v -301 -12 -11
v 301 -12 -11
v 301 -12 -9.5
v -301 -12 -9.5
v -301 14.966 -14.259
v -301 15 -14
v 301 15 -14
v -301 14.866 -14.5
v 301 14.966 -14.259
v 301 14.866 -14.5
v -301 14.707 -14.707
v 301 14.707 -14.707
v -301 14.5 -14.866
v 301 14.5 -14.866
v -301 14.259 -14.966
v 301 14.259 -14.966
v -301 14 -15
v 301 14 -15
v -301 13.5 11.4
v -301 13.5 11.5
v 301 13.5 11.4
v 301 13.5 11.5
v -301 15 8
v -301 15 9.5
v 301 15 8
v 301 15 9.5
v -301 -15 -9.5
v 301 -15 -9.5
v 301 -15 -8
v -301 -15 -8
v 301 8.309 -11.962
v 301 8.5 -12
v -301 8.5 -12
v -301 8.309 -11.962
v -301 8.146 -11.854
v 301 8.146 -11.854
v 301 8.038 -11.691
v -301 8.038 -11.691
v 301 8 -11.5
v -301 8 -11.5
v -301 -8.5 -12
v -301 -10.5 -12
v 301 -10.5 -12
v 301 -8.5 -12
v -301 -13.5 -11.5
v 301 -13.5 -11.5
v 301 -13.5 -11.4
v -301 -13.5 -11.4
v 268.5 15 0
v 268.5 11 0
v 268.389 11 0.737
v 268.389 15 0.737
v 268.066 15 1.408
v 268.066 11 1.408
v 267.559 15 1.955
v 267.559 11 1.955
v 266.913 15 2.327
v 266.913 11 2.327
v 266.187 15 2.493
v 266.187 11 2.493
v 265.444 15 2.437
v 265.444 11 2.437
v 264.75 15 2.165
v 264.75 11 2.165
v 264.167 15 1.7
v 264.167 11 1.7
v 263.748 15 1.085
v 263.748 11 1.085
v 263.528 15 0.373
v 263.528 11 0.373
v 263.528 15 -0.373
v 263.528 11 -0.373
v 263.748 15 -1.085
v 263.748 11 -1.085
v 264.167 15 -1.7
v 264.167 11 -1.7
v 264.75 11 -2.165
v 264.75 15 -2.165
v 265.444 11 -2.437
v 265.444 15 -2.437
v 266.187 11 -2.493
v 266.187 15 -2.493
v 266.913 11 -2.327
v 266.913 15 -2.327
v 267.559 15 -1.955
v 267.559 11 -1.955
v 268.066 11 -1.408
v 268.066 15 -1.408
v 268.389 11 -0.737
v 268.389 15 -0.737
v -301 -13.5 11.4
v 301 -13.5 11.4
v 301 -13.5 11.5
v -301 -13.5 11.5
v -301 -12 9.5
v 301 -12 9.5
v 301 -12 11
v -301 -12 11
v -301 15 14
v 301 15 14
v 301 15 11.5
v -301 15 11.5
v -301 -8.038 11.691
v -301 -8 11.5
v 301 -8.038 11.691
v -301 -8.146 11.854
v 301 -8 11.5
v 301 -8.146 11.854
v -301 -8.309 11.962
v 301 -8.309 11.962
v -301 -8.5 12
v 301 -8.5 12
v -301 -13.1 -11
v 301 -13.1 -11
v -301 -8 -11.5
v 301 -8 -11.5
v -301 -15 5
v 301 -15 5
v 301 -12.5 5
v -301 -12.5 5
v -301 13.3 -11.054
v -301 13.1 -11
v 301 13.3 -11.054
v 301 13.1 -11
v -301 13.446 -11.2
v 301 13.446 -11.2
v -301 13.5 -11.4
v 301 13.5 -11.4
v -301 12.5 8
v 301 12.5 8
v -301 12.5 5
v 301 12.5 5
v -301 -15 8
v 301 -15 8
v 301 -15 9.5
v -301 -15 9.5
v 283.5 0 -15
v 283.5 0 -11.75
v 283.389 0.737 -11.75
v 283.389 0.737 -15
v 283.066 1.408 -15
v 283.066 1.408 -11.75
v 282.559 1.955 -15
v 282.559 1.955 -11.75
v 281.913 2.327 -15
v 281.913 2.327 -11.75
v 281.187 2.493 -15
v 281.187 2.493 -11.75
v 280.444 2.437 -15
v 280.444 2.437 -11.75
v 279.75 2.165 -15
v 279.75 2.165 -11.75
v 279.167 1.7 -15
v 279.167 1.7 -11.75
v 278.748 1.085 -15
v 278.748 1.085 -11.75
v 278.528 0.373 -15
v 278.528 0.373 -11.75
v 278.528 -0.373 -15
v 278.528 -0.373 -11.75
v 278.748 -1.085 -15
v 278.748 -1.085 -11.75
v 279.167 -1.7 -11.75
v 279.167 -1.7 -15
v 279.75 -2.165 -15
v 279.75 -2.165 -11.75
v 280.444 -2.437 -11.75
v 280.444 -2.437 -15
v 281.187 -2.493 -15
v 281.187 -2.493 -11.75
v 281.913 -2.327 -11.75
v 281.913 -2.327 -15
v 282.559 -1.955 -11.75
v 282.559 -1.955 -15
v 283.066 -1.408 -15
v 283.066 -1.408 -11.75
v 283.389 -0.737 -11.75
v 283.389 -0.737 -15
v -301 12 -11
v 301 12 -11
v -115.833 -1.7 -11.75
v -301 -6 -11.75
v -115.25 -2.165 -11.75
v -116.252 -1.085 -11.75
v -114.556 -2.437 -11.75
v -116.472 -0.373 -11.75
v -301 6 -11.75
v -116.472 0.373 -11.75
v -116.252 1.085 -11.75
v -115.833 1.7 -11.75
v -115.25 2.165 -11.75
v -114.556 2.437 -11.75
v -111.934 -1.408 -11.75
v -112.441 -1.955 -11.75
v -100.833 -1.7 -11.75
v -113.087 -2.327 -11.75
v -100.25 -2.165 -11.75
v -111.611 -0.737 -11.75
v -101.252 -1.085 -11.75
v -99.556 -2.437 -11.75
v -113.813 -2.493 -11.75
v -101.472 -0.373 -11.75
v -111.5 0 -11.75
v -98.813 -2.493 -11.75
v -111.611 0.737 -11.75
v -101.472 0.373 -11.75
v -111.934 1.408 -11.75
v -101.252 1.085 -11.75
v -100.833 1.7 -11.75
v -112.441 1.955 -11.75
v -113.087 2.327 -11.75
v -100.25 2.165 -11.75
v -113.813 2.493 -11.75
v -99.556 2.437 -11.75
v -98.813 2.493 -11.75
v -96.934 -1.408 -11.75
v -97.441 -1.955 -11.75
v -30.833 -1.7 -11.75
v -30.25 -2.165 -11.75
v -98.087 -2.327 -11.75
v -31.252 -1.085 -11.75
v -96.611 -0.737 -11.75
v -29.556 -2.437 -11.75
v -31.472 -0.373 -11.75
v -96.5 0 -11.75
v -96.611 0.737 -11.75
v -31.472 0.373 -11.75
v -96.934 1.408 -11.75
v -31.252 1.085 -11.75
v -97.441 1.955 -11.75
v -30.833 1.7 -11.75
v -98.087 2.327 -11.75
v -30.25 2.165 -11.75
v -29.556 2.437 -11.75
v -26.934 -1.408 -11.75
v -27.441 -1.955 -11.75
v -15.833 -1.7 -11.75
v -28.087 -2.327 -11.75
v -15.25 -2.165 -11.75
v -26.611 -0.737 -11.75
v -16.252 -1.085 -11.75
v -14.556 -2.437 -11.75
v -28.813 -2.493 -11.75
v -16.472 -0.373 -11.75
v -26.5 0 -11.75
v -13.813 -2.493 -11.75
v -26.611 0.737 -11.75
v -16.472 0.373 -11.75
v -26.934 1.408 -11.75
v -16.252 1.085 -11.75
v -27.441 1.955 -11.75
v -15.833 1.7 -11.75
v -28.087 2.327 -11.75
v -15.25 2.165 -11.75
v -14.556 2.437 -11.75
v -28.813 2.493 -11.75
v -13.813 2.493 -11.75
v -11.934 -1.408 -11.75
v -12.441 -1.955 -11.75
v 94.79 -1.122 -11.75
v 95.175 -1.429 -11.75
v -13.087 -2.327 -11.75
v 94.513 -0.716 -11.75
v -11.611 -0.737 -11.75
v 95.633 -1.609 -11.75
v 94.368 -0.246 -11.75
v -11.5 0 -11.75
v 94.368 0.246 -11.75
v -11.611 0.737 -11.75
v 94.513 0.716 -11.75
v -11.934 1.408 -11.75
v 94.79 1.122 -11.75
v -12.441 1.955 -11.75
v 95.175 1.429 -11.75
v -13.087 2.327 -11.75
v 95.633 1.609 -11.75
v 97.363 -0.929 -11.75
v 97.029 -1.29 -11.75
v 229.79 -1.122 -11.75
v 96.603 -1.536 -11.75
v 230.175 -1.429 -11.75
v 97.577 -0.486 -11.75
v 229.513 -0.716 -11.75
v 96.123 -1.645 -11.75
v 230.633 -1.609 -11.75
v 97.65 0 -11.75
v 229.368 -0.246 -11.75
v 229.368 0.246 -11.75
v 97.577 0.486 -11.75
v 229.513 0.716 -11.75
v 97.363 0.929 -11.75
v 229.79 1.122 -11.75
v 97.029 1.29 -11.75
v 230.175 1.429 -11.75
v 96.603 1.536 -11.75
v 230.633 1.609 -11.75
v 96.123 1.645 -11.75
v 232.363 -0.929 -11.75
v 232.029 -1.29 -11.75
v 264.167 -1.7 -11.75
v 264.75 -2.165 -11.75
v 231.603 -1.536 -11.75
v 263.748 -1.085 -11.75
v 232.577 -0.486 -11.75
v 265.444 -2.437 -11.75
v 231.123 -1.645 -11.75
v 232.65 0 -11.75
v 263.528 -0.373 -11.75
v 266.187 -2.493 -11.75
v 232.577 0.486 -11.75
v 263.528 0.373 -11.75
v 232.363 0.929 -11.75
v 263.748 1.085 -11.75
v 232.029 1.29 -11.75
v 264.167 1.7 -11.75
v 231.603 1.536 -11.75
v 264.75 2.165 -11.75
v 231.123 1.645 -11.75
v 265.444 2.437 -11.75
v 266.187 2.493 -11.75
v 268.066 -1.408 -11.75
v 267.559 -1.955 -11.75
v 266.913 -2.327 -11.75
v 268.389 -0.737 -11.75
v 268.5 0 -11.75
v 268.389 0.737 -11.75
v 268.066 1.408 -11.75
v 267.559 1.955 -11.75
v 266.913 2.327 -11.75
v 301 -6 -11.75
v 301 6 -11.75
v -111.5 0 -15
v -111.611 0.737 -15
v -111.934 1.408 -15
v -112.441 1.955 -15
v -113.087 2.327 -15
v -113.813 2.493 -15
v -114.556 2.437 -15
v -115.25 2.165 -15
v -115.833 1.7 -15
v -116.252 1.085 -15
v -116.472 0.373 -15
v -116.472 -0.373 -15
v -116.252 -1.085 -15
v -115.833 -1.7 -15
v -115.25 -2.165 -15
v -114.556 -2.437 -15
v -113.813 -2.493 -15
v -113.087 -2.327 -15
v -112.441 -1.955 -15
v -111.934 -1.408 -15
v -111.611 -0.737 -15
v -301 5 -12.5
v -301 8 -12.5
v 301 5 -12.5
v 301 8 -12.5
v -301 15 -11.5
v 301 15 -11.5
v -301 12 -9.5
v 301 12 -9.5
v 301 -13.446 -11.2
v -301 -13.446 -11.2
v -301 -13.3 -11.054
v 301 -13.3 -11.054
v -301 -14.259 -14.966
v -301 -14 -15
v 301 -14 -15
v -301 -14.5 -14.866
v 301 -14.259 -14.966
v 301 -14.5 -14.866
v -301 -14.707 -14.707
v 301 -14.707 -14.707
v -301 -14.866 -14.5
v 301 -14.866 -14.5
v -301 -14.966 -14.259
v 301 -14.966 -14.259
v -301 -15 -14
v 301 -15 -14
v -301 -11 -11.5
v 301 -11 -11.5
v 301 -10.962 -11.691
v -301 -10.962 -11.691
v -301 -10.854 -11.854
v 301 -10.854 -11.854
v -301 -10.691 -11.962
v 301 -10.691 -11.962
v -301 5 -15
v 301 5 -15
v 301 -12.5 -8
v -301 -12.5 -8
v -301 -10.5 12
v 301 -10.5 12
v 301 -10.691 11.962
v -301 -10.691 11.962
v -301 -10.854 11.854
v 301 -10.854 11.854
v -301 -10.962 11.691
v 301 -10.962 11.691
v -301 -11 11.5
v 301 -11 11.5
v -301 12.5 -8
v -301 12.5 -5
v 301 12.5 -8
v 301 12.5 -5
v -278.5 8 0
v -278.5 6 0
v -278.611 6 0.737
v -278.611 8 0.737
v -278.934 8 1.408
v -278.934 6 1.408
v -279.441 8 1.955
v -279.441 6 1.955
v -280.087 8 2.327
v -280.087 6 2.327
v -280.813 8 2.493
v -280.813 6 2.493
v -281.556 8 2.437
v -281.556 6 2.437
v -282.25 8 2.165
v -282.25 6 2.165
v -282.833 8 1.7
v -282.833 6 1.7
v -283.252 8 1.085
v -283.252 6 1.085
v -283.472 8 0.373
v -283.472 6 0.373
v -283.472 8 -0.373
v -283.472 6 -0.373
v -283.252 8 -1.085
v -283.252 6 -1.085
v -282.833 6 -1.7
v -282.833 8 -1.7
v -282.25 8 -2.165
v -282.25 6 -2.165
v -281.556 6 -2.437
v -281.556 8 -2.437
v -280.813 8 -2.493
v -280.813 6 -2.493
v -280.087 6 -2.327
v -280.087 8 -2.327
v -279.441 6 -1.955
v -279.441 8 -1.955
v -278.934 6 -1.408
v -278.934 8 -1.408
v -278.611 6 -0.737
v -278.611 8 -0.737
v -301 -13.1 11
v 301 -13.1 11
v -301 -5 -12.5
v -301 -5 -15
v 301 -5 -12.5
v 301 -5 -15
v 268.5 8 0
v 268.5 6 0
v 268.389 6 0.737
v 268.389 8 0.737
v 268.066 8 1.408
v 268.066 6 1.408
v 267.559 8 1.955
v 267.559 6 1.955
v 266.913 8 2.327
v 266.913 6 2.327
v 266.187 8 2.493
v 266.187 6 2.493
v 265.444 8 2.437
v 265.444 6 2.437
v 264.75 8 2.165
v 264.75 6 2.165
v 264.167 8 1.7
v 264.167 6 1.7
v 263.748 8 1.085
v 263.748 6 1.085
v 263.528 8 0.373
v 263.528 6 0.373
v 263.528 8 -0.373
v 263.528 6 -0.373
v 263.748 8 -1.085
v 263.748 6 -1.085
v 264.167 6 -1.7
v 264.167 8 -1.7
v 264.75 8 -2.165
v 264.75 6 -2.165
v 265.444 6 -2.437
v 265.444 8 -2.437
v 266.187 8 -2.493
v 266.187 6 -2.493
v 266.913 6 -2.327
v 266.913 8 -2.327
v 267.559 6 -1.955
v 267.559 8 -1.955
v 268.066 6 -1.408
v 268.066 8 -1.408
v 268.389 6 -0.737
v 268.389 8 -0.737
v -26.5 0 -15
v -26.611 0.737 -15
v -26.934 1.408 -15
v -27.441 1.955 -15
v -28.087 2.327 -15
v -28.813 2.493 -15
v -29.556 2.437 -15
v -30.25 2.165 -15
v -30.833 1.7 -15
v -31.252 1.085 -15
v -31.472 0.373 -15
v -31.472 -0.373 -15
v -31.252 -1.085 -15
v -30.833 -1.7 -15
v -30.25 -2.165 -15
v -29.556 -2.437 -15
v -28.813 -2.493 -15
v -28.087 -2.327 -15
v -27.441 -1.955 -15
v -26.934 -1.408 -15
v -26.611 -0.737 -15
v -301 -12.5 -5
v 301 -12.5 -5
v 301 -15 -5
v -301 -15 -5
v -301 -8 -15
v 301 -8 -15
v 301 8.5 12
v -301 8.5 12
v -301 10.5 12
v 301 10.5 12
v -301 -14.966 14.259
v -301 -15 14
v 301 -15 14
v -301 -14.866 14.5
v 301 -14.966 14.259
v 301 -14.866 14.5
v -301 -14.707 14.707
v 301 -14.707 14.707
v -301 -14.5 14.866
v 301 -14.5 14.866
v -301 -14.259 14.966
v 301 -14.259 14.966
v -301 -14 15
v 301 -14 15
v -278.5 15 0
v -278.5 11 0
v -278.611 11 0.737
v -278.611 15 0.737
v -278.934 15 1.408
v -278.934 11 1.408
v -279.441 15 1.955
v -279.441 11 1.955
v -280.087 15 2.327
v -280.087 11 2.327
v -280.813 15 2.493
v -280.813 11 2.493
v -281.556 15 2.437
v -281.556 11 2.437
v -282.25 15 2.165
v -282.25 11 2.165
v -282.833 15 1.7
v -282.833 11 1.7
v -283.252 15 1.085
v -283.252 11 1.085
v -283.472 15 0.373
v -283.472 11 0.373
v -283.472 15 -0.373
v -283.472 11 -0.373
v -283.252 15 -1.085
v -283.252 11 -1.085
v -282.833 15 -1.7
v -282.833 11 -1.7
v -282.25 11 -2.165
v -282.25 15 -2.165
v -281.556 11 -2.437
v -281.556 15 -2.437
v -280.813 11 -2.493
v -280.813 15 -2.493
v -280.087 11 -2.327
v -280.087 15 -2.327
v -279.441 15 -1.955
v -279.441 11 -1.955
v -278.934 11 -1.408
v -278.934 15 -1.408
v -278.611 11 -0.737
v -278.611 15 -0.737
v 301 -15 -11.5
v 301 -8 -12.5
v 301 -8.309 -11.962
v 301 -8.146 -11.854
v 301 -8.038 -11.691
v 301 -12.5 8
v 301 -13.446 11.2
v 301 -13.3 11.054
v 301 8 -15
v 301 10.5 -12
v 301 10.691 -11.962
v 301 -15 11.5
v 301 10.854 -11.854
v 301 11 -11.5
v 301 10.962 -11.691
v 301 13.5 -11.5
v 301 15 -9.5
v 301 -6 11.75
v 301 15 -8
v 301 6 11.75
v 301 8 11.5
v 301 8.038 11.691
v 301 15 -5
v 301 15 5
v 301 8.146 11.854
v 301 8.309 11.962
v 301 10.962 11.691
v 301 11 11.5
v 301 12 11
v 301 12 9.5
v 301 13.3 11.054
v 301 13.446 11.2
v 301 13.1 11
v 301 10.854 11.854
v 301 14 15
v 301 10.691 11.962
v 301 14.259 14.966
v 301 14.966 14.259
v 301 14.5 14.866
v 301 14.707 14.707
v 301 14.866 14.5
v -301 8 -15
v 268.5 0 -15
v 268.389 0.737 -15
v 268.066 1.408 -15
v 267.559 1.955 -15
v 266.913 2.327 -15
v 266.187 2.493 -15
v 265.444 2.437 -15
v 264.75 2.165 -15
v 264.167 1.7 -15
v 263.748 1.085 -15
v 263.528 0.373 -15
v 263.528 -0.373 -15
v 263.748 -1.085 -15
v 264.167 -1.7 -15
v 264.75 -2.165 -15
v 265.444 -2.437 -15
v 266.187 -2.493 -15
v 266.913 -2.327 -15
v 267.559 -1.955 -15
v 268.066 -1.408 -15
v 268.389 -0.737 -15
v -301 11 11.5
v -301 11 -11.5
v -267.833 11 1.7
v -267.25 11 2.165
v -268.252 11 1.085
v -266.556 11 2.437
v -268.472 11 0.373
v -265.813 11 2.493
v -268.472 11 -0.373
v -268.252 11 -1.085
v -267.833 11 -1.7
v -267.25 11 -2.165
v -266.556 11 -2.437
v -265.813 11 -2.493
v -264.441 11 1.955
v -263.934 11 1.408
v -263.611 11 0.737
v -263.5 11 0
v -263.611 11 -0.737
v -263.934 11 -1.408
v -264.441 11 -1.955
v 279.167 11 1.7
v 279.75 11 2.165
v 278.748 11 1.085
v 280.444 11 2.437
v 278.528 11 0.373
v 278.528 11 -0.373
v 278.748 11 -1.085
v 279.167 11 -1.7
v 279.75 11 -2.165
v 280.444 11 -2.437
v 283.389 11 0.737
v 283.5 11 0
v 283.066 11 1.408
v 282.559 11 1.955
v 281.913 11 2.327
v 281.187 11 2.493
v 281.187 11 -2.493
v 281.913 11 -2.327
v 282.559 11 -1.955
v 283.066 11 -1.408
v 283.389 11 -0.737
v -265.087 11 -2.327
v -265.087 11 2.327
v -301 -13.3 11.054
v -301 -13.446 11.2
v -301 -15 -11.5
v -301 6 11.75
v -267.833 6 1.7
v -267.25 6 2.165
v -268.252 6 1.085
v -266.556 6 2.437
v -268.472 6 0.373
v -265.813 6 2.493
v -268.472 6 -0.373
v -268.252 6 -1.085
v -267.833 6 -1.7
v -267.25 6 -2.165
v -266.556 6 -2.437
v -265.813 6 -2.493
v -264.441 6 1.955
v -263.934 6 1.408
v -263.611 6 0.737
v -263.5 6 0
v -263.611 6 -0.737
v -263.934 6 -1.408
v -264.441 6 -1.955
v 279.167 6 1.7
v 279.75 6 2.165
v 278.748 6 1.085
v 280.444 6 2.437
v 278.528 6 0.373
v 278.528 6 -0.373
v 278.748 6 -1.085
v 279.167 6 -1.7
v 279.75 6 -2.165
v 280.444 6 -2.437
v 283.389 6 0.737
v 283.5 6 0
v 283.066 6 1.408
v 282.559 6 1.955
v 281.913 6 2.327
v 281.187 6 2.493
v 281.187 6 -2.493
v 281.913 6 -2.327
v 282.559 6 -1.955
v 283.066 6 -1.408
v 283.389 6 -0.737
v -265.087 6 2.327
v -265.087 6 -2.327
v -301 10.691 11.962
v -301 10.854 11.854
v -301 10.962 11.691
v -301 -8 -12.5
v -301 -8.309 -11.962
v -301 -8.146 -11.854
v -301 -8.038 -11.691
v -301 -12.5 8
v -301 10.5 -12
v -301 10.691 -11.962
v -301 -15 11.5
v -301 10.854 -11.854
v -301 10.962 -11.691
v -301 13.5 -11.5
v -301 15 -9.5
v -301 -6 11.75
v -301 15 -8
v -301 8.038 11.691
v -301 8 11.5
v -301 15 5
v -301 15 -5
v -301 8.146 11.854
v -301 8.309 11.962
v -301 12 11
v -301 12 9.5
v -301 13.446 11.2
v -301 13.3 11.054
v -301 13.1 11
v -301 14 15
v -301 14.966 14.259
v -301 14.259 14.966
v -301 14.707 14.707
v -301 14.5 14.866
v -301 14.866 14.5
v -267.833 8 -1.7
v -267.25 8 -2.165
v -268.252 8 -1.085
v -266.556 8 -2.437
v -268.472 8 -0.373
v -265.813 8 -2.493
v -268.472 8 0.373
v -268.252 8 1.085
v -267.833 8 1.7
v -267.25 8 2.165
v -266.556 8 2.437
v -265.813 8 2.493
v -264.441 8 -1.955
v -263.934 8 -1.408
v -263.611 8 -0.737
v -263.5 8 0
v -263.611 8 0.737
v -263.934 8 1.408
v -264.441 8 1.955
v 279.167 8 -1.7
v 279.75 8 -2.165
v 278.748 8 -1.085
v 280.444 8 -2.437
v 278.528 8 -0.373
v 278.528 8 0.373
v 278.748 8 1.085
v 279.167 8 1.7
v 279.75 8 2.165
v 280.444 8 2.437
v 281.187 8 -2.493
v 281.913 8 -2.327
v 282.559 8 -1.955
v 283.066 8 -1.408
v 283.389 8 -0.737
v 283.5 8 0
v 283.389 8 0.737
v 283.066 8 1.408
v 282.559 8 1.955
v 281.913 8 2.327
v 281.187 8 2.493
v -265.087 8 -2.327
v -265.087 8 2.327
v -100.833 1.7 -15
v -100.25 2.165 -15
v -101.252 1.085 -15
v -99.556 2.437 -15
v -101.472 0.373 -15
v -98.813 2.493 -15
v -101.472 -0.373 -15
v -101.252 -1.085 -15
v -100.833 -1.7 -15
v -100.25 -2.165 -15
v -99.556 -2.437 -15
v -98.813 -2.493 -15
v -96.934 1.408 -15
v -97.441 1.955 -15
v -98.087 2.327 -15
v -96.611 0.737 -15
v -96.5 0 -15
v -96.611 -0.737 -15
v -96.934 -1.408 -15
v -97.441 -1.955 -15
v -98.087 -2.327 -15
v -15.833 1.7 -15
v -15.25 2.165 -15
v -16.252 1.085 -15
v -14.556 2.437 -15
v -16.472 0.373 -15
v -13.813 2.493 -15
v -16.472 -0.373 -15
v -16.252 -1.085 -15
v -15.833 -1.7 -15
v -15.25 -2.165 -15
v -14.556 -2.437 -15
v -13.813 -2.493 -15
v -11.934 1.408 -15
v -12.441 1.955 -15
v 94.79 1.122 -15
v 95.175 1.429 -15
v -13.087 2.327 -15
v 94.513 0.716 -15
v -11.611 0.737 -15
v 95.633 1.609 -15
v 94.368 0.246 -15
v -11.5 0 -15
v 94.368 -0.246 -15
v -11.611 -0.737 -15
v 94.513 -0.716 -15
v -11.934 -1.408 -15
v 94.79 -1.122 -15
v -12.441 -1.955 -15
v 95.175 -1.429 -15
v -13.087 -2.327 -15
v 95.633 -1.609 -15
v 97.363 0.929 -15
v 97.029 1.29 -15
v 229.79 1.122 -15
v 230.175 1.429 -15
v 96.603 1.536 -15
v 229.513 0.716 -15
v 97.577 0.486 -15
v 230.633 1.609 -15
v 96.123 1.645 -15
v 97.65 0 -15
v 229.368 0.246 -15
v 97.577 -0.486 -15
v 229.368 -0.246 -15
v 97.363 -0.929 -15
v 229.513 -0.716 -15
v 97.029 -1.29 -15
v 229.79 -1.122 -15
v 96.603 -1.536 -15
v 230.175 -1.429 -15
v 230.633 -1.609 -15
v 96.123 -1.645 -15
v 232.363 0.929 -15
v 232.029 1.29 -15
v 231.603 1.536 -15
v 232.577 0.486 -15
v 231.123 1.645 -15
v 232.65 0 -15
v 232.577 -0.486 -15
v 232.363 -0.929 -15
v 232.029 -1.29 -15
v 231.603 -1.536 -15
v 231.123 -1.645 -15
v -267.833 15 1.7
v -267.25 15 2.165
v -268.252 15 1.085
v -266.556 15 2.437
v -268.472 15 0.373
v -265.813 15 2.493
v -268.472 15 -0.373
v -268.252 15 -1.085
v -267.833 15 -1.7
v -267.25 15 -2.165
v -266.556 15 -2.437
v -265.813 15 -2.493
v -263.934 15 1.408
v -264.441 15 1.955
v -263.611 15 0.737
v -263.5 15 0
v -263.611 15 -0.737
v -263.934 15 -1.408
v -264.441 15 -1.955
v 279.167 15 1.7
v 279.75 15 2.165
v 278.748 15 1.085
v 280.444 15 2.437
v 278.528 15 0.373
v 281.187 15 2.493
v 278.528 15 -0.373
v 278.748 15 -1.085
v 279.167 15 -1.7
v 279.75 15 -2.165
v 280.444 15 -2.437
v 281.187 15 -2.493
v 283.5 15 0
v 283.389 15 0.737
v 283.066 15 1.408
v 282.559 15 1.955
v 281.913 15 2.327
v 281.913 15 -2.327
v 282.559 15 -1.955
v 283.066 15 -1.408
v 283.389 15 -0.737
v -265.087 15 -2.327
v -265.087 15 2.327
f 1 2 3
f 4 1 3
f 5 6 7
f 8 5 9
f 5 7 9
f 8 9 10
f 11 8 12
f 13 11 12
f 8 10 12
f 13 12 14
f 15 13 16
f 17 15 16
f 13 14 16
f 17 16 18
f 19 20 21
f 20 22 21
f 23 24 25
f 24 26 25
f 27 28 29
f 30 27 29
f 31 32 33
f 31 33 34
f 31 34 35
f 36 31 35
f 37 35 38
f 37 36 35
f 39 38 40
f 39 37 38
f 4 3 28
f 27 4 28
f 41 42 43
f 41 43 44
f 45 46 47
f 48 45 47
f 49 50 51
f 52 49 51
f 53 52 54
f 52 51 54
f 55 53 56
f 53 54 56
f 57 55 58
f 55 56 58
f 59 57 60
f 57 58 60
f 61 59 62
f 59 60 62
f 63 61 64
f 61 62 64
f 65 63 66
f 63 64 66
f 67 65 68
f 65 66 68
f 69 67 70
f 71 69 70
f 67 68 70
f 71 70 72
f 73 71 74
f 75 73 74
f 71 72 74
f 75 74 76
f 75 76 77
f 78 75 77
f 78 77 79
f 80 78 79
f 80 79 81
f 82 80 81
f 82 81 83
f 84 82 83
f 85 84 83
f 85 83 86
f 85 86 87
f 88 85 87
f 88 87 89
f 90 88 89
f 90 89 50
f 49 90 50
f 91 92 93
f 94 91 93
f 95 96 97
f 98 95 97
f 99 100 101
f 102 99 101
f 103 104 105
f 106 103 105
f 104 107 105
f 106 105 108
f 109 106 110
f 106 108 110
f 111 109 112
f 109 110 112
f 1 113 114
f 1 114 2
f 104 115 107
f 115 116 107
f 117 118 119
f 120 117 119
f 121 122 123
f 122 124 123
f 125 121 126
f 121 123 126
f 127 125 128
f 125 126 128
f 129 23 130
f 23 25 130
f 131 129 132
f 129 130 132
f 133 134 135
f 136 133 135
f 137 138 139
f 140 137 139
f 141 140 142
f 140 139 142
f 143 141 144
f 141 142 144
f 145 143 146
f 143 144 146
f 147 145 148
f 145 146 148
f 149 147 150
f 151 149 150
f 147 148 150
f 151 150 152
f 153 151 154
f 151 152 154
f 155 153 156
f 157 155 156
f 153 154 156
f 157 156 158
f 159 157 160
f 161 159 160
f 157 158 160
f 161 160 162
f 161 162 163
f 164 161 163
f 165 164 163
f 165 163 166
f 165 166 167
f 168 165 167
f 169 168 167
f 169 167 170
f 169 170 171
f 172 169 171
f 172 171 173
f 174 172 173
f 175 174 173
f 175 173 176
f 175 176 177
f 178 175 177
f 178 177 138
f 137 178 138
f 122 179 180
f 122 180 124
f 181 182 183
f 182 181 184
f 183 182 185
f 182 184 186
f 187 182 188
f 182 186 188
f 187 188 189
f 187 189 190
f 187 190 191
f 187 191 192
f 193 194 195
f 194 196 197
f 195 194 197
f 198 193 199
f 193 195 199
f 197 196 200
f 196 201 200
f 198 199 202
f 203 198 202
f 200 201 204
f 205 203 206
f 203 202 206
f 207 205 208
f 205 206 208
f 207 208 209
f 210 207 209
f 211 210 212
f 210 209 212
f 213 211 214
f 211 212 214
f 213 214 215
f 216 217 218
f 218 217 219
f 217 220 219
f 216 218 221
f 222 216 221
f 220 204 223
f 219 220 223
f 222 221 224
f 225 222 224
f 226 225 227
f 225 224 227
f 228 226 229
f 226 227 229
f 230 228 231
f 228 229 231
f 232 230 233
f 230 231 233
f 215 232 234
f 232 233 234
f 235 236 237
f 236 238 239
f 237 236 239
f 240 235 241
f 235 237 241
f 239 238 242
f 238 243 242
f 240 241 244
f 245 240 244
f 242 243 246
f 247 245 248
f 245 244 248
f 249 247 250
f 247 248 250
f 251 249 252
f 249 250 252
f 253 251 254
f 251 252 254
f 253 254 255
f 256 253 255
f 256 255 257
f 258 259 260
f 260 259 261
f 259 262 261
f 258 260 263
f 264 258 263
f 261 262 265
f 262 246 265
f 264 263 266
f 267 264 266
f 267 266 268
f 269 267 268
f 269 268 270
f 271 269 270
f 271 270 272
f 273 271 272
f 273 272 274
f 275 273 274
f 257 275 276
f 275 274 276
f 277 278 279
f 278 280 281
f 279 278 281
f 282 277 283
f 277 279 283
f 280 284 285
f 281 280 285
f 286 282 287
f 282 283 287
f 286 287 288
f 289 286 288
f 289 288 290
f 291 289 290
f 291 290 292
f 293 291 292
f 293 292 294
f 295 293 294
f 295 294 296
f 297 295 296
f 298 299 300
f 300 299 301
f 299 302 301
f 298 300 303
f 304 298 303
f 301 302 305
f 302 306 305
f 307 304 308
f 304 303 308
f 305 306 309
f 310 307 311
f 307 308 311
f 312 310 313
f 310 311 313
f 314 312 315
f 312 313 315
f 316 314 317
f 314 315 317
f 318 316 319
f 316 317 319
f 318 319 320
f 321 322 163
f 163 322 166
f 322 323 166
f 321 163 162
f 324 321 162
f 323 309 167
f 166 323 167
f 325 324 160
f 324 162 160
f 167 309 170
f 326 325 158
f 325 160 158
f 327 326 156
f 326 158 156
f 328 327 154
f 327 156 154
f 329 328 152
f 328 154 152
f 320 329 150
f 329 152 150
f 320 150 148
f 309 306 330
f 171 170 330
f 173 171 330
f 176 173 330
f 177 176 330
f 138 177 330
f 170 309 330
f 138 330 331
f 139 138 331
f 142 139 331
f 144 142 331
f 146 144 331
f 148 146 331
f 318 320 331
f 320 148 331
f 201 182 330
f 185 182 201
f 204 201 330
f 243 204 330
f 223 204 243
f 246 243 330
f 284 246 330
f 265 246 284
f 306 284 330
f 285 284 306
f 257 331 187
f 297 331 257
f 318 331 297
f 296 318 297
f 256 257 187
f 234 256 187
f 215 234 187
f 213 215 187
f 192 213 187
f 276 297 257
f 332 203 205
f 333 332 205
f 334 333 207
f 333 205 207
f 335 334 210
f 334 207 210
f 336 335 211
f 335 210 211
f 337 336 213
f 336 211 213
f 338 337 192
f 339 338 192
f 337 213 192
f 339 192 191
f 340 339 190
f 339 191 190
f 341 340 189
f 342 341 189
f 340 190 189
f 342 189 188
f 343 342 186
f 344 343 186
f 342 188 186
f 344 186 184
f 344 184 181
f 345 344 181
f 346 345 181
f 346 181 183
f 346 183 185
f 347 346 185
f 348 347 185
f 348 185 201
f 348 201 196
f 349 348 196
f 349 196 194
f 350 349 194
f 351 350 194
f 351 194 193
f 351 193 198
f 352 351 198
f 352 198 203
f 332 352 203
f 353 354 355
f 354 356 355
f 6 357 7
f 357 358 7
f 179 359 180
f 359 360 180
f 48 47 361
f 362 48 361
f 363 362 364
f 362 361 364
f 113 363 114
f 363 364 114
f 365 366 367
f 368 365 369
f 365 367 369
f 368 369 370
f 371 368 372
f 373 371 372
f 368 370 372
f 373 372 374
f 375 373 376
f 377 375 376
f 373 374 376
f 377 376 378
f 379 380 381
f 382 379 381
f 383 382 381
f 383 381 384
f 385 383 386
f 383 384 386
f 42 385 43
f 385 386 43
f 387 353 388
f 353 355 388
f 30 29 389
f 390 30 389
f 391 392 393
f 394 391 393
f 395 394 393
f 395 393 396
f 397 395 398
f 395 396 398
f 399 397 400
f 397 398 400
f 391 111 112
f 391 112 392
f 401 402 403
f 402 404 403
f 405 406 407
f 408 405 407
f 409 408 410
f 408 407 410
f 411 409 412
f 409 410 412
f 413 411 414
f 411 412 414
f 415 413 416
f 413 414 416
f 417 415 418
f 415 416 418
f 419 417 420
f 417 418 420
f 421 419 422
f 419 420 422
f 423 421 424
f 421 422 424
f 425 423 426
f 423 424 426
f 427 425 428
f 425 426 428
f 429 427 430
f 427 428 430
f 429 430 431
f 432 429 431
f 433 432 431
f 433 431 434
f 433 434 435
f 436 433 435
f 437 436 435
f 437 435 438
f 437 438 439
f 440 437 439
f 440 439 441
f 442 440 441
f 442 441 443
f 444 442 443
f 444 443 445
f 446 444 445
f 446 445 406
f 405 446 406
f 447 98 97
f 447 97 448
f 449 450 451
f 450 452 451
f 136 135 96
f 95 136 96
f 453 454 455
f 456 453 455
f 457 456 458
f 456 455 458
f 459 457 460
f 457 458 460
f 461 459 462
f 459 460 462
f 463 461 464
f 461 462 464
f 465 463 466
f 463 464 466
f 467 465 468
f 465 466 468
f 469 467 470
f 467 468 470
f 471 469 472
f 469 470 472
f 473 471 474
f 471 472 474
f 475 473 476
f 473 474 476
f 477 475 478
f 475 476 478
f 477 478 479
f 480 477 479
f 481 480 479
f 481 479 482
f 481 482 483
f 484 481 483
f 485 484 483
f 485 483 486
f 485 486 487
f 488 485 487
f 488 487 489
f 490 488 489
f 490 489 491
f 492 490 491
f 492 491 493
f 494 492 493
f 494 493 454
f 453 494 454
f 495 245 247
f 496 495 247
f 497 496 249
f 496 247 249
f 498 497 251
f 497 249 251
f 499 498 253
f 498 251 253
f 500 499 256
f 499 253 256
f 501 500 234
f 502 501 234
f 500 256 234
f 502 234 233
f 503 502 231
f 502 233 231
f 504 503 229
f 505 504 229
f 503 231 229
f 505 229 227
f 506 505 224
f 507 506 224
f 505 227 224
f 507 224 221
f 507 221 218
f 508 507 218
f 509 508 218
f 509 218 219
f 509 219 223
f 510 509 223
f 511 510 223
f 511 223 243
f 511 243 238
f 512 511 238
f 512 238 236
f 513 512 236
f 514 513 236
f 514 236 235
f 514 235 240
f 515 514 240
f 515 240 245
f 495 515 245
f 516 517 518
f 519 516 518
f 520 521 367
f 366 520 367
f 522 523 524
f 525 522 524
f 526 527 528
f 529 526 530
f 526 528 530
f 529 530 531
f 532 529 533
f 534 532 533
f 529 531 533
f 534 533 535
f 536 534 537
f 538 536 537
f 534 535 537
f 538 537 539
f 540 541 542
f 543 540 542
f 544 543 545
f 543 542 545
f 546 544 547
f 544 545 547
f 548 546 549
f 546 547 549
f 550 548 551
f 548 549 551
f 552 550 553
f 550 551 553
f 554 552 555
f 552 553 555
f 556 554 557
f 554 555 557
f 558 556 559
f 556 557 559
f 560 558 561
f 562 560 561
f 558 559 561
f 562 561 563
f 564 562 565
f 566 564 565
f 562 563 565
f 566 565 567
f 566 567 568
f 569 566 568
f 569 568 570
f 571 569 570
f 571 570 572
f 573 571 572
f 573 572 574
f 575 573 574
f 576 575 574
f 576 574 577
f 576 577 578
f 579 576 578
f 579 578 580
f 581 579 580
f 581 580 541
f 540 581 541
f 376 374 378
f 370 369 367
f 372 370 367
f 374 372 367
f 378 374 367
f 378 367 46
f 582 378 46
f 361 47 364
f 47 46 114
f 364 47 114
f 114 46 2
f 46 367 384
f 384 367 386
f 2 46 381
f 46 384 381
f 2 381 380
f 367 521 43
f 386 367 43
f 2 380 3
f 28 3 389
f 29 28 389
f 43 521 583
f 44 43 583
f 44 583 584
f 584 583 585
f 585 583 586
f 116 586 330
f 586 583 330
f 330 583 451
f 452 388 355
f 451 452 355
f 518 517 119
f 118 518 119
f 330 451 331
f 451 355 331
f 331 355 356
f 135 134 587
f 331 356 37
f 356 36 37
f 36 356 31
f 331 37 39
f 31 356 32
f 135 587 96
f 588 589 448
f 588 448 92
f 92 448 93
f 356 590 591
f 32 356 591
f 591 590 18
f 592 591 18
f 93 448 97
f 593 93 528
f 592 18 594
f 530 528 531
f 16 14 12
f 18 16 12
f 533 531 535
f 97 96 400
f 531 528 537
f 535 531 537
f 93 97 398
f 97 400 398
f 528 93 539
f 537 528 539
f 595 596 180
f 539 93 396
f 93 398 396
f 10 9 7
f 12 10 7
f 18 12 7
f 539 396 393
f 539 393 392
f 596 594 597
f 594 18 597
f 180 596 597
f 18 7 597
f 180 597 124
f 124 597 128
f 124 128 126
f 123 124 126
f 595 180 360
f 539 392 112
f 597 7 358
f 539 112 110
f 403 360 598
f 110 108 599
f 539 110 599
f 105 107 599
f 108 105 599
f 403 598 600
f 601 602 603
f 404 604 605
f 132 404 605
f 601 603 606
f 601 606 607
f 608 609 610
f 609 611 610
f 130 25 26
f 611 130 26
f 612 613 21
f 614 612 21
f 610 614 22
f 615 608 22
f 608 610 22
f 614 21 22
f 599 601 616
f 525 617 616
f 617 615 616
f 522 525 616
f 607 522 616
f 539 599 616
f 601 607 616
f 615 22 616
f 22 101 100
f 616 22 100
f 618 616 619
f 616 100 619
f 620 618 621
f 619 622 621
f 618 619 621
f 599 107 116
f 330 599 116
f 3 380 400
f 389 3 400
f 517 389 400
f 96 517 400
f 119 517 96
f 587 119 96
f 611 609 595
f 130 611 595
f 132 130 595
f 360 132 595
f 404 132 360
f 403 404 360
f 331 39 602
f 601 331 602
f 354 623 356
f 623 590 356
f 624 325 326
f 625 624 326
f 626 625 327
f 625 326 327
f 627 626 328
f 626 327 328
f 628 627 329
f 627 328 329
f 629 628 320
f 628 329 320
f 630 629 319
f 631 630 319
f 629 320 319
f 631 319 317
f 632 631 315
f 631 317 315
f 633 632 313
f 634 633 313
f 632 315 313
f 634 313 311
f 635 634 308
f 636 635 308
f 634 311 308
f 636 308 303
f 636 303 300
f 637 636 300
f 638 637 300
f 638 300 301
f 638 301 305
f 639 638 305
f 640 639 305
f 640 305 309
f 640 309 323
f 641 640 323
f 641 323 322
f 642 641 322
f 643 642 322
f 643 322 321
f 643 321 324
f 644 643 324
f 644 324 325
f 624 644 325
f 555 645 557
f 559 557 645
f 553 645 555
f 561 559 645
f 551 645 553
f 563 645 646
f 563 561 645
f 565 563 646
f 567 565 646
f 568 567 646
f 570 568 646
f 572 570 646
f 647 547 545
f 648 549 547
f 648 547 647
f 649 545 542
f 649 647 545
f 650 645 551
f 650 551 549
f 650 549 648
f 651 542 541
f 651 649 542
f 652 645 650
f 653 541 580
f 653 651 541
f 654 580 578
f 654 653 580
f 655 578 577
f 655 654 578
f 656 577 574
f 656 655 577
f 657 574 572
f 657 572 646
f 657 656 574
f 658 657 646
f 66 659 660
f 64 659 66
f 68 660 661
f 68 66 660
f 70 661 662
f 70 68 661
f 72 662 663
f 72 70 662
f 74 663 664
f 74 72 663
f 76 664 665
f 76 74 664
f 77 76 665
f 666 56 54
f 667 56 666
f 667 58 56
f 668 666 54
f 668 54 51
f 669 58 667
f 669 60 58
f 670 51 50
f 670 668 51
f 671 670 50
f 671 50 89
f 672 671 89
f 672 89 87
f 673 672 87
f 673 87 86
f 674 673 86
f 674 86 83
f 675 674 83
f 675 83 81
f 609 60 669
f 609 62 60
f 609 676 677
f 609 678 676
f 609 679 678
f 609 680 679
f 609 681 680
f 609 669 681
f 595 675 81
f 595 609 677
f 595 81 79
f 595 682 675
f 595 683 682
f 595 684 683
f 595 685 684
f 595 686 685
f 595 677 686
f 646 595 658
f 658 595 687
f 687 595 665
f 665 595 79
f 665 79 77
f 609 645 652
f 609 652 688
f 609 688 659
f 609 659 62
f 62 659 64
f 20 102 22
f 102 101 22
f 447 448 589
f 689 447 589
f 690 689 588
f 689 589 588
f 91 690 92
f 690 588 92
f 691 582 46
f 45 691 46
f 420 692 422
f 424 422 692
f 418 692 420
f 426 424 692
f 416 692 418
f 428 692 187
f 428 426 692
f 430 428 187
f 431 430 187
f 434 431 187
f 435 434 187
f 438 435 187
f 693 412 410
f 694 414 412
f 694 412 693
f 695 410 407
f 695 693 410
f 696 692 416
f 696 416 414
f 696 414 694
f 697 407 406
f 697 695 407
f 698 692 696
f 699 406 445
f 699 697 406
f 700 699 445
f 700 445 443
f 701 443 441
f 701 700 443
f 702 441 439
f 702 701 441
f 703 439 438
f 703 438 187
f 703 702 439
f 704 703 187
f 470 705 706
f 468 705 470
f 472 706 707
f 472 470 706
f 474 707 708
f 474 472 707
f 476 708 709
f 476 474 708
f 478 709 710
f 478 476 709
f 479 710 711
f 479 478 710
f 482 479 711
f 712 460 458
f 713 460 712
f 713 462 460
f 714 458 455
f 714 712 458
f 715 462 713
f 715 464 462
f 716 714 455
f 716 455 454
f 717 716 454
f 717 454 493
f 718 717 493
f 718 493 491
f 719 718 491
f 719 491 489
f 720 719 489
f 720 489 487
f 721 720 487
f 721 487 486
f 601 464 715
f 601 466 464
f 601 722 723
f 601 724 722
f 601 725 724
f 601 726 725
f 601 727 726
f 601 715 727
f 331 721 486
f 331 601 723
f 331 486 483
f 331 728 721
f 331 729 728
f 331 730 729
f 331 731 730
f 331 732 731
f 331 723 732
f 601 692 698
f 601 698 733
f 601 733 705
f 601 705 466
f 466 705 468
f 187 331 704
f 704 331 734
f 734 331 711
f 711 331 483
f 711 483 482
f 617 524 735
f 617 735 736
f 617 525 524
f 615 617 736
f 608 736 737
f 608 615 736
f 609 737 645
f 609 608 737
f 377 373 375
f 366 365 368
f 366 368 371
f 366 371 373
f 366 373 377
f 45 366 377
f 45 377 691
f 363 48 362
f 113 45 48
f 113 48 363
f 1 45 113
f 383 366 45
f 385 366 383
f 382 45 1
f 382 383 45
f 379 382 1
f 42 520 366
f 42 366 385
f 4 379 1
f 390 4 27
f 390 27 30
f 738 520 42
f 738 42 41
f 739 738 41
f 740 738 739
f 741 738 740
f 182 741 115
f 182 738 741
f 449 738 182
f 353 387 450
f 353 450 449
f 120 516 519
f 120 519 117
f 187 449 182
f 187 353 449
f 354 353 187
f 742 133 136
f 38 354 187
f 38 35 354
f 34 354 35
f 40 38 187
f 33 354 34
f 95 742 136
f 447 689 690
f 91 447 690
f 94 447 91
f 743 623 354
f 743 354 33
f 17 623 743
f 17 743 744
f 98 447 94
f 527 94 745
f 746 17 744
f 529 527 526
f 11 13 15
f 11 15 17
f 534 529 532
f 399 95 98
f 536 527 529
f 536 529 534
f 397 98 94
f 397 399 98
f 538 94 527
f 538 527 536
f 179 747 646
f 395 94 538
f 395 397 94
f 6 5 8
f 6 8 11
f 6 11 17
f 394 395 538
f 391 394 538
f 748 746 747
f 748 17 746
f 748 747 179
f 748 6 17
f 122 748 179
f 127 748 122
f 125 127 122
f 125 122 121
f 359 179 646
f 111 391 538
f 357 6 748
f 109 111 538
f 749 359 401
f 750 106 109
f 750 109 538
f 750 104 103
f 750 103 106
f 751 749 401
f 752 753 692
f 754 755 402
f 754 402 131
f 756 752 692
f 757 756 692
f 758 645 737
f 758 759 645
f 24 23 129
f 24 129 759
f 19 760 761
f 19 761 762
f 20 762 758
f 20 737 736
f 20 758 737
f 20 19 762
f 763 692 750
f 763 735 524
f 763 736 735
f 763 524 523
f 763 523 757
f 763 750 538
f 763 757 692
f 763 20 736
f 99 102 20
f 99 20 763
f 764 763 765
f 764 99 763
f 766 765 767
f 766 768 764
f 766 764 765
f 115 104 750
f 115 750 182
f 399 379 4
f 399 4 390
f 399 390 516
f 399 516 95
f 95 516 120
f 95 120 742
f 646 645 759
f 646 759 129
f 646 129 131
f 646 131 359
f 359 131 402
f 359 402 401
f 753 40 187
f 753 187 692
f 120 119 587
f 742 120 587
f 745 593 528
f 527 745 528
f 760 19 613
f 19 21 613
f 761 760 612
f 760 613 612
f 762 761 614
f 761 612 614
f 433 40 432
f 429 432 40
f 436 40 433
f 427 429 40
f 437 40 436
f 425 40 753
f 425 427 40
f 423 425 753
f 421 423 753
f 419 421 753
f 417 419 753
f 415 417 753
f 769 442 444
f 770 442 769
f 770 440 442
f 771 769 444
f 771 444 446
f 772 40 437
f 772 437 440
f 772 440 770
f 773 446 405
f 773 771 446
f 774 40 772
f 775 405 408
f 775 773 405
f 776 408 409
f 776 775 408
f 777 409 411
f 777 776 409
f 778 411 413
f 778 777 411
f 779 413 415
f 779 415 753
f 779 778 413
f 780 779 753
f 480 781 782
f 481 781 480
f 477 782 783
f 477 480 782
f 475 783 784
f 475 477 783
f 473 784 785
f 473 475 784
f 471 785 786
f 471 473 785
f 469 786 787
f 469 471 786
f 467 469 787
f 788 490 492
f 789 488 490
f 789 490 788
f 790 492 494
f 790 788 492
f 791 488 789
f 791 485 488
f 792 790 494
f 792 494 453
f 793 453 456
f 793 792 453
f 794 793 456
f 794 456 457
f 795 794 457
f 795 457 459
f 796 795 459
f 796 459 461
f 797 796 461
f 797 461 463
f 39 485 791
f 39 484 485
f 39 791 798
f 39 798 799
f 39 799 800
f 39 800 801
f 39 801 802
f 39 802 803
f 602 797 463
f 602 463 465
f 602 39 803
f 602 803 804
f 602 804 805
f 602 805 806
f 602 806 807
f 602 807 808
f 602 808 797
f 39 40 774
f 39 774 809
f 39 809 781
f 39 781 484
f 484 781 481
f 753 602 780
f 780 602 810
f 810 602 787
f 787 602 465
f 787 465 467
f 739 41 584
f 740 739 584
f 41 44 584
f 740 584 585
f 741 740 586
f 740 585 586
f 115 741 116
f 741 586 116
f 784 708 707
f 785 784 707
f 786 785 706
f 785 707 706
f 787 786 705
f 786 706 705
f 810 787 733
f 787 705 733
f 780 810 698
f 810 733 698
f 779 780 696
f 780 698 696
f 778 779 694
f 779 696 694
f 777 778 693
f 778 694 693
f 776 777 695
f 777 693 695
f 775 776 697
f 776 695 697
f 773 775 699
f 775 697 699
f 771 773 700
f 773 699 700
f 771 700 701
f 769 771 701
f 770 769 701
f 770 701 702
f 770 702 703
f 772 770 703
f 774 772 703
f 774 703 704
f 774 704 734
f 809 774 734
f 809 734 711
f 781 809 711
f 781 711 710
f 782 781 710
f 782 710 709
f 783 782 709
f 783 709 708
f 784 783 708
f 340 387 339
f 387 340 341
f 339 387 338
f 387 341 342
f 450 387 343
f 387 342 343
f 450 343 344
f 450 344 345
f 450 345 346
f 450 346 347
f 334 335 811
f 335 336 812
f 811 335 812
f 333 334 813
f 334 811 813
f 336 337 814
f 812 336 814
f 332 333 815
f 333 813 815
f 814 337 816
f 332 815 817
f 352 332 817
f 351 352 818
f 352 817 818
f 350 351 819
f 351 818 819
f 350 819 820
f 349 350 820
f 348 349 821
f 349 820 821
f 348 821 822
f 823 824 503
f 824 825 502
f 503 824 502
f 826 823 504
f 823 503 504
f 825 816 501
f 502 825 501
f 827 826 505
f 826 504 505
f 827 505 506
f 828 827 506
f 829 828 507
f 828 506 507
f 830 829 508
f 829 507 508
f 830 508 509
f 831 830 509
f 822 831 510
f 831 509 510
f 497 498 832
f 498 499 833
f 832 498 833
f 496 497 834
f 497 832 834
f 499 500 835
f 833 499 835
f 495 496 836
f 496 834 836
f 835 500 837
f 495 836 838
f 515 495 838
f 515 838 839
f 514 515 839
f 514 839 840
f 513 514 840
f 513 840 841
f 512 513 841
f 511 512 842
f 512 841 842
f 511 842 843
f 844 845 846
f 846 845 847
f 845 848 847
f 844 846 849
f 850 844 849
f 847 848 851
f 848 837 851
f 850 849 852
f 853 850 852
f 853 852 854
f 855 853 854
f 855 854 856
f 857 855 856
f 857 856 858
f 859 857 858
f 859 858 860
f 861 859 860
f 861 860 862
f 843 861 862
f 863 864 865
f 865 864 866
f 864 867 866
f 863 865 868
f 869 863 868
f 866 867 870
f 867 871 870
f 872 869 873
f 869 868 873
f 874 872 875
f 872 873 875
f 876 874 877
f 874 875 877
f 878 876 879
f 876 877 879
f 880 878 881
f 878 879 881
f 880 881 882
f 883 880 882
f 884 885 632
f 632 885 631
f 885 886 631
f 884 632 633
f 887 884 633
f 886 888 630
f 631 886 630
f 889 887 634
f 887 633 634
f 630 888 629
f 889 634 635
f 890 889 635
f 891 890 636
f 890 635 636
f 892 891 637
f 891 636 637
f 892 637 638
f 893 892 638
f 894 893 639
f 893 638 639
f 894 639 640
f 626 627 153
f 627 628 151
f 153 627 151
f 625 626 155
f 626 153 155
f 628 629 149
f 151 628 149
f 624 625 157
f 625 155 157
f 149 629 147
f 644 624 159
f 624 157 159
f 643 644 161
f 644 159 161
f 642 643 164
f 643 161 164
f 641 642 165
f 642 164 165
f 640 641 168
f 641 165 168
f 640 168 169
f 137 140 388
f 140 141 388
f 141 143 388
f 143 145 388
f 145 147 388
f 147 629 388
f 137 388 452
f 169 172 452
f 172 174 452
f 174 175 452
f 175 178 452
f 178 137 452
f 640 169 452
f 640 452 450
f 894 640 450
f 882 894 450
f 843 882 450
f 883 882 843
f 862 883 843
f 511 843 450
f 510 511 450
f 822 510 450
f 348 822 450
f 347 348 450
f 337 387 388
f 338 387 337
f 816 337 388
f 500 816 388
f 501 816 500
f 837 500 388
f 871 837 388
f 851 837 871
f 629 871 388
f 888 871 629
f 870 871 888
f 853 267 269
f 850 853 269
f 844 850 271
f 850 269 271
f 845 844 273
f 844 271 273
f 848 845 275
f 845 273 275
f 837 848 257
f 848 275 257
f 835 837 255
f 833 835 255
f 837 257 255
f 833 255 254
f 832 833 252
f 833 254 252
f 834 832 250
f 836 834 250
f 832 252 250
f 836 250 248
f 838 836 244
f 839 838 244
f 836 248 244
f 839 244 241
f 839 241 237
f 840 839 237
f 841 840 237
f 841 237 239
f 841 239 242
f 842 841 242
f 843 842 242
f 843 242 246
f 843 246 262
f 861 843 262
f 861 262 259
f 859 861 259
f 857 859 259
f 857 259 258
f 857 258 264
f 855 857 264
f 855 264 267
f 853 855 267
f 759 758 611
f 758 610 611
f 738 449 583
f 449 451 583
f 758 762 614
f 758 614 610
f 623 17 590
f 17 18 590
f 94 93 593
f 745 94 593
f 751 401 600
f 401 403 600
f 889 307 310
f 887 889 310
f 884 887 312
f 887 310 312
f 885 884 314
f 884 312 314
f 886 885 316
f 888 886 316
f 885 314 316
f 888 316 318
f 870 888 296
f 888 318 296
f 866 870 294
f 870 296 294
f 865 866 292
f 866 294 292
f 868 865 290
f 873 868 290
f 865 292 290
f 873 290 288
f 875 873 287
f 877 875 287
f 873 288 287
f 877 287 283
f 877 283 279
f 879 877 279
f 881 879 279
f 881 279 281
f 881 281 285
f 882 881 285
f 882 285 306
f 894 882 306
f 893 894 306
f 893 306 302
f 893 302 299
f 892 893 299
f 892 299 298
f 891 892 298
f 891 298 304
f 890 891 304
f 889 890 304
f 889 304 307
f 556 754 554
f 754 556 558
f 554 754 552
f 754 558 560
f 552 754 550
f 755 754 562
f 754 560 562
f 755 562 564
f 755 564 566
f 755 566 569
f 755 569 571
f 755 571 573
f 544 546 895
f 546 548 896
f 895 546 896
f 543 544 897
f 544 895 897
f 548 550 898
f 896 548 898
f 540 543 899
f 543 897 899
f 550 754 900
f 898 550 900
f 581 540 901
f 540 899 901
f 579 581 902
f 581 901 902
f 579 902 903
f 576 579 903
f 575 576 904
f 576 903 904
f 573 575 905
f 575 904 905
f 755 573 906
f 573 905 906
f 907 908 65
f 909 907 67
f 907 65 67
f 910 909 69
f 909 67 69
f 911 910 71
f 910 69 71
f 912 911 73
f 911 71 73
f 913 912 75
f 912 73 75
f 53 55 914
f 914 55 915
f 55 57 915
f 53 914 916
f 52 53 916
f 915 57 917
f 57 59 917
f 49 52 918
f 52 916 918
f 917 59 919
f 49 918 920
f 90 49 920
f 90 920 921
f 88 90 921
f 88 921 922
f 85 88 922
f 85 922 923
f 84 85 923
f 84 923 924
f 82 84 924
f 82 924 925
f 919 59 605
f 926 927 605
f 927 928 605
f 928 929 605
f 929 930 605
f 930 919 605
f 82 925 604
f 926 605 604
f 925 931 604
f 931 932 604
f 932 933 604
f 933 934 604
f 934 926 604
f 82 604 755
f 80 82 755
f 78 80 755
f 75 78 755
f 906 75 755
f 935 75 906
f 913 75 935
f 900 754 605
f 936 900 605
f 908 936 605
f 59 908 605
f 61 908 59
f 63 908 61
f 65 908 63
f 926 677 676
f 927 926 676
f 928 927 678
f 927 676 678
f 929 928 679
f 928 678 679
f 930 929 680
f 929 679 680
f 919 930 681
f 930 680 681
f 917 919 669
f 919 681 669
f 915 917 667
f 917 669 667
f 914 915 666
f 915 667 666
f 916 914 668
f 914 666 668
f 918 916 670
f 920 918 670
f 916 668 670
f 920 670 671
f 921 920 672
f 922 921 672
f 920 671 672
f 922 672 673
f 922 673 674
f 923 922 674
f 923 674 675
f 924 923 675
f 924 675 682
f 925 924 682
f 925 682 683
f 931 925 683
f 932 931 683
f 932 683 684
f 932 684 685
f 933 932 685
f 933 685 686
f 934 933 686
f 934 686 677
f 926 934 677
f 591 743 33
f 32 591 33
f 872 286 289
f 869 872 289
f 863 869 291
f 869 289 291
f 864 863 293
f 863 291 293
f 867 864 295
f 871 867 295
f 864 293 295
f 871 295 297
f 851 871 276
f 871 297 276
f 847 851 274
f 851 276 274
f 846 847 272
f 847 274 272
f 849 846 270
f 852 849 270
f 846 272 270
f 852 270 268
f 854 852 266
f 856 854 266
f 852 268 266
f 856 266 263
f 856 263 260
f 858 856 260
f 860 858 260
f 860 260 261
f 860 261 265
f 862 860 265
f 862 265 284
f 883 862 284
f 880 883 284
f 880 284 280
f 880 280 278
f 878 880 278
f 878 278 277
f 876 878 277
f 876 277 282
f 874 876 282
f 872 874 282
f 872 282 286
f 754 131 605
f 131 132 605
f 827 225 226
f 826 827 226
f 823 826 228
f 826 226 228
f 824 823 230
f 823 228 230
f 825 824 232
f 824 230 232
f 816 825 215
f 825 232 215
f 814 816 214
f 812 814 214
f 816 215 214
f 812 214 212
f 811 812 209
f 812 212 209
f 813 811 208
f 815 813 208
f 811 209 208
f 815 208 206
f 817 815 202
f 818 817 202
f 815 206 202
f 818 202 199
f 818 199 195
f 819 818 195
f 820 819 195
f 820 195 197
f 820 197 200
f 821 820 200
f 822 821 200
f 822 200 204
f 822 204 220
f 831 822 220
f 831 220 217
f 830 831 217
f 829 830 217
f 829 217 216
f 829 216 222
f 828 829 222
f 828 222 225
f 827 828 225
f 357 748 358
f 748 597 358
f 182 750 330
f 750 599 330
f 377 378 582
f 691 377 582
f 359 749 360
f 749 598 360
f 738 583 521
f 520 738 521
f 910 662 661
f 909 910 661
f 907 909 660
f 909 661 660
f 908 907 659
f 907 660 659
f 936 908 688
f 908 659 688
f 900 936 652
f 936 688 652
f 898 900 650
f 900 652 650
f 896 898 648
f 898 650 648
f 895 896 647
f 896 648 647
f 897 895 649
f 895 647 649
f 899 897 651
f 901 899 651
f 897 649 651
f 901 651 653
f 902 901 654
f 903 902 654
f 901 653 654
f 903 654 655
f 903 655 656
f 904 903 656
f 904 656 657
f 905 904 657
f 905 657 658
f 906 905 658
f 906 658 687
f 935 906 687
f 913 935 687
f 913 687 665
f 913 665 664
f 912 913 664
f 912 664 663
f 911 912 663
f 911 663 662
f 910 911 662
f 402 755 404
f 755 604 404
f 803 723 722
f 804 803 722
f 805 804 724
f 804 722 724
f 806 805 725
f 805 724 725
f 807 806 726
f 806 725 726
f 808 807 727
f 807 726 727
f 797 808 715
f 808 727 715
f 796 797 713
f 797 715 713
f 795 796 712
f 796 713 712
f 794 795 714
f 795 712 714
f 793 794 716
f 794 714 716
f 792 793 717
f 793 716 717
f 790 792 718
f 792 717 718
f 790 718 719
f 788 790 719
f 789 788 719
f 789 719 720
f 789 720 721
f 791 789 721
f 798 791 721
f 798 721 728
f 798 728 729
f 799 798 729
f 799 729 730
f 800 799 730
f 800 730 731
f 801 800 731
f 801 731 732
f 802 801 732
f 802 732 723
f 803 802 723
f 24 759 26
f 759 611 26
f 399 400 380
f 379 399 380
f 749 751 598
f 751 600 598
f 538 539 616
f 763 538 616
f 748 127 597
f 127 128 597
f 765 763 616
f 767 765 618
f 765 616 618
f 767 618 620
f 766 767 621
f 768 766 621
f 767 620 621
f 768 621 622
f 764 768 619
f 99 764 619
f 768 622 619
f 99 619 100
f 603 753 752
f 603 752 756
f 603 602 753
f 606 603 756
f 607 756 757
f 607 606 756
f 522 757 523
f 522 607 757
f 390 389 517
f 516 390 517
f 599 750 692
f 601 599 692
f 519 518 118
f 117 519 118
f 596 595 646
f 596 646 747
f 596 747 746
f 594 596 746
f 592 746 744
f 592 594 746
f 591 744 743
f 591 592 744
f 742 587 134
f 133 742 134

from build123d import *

# Parameters (mm, degrees)
SKETCH_1_W             = 23.5
SKETCH_1_H             = 12
EXTRUDE_1_DEPTH        = 301
HOLE_WIZARD_M6_1_D     = 5
HOLE_WIZARD_M6_1_DEPTH = 15
HOLE_WIZARD_M6_1_TIP   = 1.502151548
HOLE_WIZARD_M6_2_D     = 5
HOLE_WIZARD_M6_2_DEPTH = 15
HOLE_WIZARD_M6_2_TIP   = 1.502151548
HOLE_WIZARD_M4_1_D     = 3.3
HOLE_WIZARD_M4_1_DEPTH = 10.1
HOLE_WIZARD_M4_1_TIP   = 0.991420021


with BuildPart() as part:
    # 草图1 → 凸台-拉伸1 (new, symmetric)
    with BuildSketch(Plane(origin=(0, 0, 0), x_dir=(0, 0, -1), z_dir=(1, 0, 0))):
        with BuildLine():
            Line((-14, 15), (-11.5, 15))
            Line((-11.5, 15), (-11.5, 13.5))
            Line((-11.5, 13.5), (-11.4, 13.5))
            ThreePointArc((-11.4, 13.5), (-11.117157288, 13.382842712), (-11, 13.1))
            Line((-11, 13.1), (-11, 12))
            Line((-11, 12), (-9.5, 12))
            Line((-9.5, 12), (-9.5, 15))
            Line((-9.5, 15), (-8, 15))
            Line((-8, 15), (-8, 12.5))
            Line((-8, 12.5), (-5, 12.5))
            Line((-5, 12.5), (-5, 15))
            Line((-5, 15), (5, 15))
            Line((5, 15), (5, 12.5))
            Line((5, 12.5), (8, 12.5))
            Line((8, 12.5), (8, 15))
            Line((8, 15), (9.5, 15))
            Line((9.5, 15), (9.5, 12))
            Line((9.5, 12), (11, 12))
            Line((11, 12), (11, 13.1))
            ThreePointArc((11, 13.1), (11.117157288, 13.382842712), (11.4, 13.5))
            Line((11.4, 13.5), (11.5, 13.5))
            Line((11.5, 13.5), (11.5, 15))
            Line((11.5, 15), (14, 15))
            ThreePointArc((14, 15), (14.707106781, 14.707106781), (15, 14))
            Line((15, 14), (15, 8))
            Line((15, 8), (12.5, 8))
            Line((12.5, 8), (12.5, 5))
            Line((12.5, 5), (15, 5))
            Line((15, 5), (15, -5))
            Line((15, -5), (12.5, -5))
            Line((12.5, -5), (12.5, -8))
            Line((12.5, -8), (15, -8))
            Line((15, -8), (15, -14))
            ThreePointArc((15, -14), (14.707106781, -14.707106781), (14, -15))
            Line((14, -15), (11.5, -15))
            Line((11.5, -15), (11.5, -13.5))
            Line((11.5, -13.5), (11.4, -13.5))
            ThreePointArc((11.4, -13.5), (11.117157288, -13.382842712), (11, -13.1))
            Line((11, -13.1), (11, -12))
            Line((11, -12), (9.5, -12))
            Line((9.5, -12), (9.5, -15))
            Line((9.5, -15), (8, -15))
            Line((8, -15), (8, -12.5))
            Line((8, -12.5), (5, -12.5))
            Line((5, -12.5), (5, -15))
            Line((5, -15), (-5, -15))
            Line((-5, -15), (-5, -12.5))
            Line((-5, -12.5), (-8, -12.5))
            Line((-8, -12.5), (-8, -15))
            Line((-8, -15), (-9.5, -15))
            Line((-9.5, -15), (-9.5, -12))
            Line((-9.5, -12), (-11, -12))
            Line((-11, -12), (-11, -13.1))
            ThreePointArc((-11, -13.1), (-11.117157288, -13.382842712), (-11.4, -13.5))
            Line((-11.4, -13.5), (-11.5, -13.5))
            Line((-11.5, -13.5), (-11.5, -15))
            Line((-11.5, -15), (-14, -15))
            ThreePointArc((-14, -15), (-14.707106781, -14.707106781), (-15, -14))
            Line((-15, -14), (-15, 14))
            ThreePointArc((-15, 14), (-14.707106781, 14.707106781), (-14, 15))
        make_face()
        with BuildLine():
            Line((12, -10.5), (12, -8.5))
            ThreePointArc((12, -8.5), (11.853553391, -8.146446609), (11.5, -8))
            Line((11.5, -8), (-11.5, -8))
            ThreePointArc((-11.5, -8), (-11.853553391, -8.146446609), (-12, -8.5))
            Line((-12, -8.5), (-12, -10.5))
            ThreePointArc((-12, -10.5), (-11.853553391, -10.853553391), (-11.5, -11))
            Line((-11.5, -11), (11.5, -11))
            ThreePointArc((11.5, -11), (11.853553391, -10.853553391), (12, -10.5))
        make_face(mode=Mode.SUBTRACT)
        with BuildLine():
            Line((-11.5, 11), (11.5, 11))
            ThreePointArc((11.5, 11), (11.853553391, 10.853553391), (12, 10.5))
            Line((12, 10.5), (12, 8.5))
            ThreePointArc((12, 8.5), (11.853553391, 8.146446609), (11.5, 8))
            Line((11.5, 8), (-11.5, 8))
            ThreePointArc((-11.5, 8), (-11.853553391, 8.146446609), (-12, 8.5))
            Line((-12, 8.5), (-12, 10.5))
            ThreePointArc((-12, 10.5), (-11.853553391, 10.853553391), (-11.5, 11))
        make_face(mode=Mode.SUBTRACT)
        Rectangle(SKETCH_1_W, SKETCH_1_H, mode=Mode.SUBTRACT)
    extrude(amount=EXTRUDE_1_DEPTH, both=True)

    # M6 螺纹孔1
    with Locations(Plane(origin=(0, 0, -15), x_dir=(-1, 0, 0), z_dir=(0, 0, -1))):
        with Locations((-281, 0), (-266, 0), (29, 0), (14, 0), (99, 0), (114, 0)):
            Hole(HOLE_WIZARD_M6_1_D / 2, depth=HOLE_WIZARD_M6_1_DEPTH)
            with Locations((0, 0, -(HOLE_WIZARD_M6_1_DEPTH + HOLE_WIZARD_M6_1_TIP / 2))):  # 118° drill point
                Cone(0, HOLE_WIZARD_M6_1_D / 2, HOLE_WIZARD_M6_1_TIP, mode=Mode.SUBTRACT)

    # M6 螺纹孔2
    with Locations(Plane(origin=(0, 15, 0), x_dir=(-1, 0, 0), z_dir=(0, 1, 0))):
        with Locations((281, 0), (266, 0), (-266, 0), (-281, 0)):
            Hole(HOLE_WIZARD_M6_2_D / 2, depth=HOLE_WIZARD_M6_2_DEPTH)
            with Locations((0, 0, -(HOLE_WIZARD_M6_2_DEPTH + HOLE_WIZARD_M6_2_TIP / 2))):  # 118° drill point
                Cone(0, HOLE_WIZARD_M6_2_D / 2, HOLE_WIZARD_M6_2_TIP, mode=Mode.SUBTRACT)

    # M4 螺纹孔1
    with Locations(Plane(origin=(0, 0, -15), x_dir=(-1, 0, 0), z_dir=(0, 0, -1))):
        with Locations((-96, 0), (-231, 0)):
            Hole(HOLE_WIZARD_M4_1_D / 2, depth=HOLE_WIZARD_M4_1_DEPTH)
            with Locations((0, 0, -(HOLE_WIZARD_M4_1_DEPTH + HOLE_WIZARD_M4_1_TIP / 2))):  # 118° drill point
                Cone(0, HOLE_WIZARD_M4_1_D / 2, HOLE_WIZARD_M4_1_TIP, mode=Mode.SUBTRACT)


solid = part.part
